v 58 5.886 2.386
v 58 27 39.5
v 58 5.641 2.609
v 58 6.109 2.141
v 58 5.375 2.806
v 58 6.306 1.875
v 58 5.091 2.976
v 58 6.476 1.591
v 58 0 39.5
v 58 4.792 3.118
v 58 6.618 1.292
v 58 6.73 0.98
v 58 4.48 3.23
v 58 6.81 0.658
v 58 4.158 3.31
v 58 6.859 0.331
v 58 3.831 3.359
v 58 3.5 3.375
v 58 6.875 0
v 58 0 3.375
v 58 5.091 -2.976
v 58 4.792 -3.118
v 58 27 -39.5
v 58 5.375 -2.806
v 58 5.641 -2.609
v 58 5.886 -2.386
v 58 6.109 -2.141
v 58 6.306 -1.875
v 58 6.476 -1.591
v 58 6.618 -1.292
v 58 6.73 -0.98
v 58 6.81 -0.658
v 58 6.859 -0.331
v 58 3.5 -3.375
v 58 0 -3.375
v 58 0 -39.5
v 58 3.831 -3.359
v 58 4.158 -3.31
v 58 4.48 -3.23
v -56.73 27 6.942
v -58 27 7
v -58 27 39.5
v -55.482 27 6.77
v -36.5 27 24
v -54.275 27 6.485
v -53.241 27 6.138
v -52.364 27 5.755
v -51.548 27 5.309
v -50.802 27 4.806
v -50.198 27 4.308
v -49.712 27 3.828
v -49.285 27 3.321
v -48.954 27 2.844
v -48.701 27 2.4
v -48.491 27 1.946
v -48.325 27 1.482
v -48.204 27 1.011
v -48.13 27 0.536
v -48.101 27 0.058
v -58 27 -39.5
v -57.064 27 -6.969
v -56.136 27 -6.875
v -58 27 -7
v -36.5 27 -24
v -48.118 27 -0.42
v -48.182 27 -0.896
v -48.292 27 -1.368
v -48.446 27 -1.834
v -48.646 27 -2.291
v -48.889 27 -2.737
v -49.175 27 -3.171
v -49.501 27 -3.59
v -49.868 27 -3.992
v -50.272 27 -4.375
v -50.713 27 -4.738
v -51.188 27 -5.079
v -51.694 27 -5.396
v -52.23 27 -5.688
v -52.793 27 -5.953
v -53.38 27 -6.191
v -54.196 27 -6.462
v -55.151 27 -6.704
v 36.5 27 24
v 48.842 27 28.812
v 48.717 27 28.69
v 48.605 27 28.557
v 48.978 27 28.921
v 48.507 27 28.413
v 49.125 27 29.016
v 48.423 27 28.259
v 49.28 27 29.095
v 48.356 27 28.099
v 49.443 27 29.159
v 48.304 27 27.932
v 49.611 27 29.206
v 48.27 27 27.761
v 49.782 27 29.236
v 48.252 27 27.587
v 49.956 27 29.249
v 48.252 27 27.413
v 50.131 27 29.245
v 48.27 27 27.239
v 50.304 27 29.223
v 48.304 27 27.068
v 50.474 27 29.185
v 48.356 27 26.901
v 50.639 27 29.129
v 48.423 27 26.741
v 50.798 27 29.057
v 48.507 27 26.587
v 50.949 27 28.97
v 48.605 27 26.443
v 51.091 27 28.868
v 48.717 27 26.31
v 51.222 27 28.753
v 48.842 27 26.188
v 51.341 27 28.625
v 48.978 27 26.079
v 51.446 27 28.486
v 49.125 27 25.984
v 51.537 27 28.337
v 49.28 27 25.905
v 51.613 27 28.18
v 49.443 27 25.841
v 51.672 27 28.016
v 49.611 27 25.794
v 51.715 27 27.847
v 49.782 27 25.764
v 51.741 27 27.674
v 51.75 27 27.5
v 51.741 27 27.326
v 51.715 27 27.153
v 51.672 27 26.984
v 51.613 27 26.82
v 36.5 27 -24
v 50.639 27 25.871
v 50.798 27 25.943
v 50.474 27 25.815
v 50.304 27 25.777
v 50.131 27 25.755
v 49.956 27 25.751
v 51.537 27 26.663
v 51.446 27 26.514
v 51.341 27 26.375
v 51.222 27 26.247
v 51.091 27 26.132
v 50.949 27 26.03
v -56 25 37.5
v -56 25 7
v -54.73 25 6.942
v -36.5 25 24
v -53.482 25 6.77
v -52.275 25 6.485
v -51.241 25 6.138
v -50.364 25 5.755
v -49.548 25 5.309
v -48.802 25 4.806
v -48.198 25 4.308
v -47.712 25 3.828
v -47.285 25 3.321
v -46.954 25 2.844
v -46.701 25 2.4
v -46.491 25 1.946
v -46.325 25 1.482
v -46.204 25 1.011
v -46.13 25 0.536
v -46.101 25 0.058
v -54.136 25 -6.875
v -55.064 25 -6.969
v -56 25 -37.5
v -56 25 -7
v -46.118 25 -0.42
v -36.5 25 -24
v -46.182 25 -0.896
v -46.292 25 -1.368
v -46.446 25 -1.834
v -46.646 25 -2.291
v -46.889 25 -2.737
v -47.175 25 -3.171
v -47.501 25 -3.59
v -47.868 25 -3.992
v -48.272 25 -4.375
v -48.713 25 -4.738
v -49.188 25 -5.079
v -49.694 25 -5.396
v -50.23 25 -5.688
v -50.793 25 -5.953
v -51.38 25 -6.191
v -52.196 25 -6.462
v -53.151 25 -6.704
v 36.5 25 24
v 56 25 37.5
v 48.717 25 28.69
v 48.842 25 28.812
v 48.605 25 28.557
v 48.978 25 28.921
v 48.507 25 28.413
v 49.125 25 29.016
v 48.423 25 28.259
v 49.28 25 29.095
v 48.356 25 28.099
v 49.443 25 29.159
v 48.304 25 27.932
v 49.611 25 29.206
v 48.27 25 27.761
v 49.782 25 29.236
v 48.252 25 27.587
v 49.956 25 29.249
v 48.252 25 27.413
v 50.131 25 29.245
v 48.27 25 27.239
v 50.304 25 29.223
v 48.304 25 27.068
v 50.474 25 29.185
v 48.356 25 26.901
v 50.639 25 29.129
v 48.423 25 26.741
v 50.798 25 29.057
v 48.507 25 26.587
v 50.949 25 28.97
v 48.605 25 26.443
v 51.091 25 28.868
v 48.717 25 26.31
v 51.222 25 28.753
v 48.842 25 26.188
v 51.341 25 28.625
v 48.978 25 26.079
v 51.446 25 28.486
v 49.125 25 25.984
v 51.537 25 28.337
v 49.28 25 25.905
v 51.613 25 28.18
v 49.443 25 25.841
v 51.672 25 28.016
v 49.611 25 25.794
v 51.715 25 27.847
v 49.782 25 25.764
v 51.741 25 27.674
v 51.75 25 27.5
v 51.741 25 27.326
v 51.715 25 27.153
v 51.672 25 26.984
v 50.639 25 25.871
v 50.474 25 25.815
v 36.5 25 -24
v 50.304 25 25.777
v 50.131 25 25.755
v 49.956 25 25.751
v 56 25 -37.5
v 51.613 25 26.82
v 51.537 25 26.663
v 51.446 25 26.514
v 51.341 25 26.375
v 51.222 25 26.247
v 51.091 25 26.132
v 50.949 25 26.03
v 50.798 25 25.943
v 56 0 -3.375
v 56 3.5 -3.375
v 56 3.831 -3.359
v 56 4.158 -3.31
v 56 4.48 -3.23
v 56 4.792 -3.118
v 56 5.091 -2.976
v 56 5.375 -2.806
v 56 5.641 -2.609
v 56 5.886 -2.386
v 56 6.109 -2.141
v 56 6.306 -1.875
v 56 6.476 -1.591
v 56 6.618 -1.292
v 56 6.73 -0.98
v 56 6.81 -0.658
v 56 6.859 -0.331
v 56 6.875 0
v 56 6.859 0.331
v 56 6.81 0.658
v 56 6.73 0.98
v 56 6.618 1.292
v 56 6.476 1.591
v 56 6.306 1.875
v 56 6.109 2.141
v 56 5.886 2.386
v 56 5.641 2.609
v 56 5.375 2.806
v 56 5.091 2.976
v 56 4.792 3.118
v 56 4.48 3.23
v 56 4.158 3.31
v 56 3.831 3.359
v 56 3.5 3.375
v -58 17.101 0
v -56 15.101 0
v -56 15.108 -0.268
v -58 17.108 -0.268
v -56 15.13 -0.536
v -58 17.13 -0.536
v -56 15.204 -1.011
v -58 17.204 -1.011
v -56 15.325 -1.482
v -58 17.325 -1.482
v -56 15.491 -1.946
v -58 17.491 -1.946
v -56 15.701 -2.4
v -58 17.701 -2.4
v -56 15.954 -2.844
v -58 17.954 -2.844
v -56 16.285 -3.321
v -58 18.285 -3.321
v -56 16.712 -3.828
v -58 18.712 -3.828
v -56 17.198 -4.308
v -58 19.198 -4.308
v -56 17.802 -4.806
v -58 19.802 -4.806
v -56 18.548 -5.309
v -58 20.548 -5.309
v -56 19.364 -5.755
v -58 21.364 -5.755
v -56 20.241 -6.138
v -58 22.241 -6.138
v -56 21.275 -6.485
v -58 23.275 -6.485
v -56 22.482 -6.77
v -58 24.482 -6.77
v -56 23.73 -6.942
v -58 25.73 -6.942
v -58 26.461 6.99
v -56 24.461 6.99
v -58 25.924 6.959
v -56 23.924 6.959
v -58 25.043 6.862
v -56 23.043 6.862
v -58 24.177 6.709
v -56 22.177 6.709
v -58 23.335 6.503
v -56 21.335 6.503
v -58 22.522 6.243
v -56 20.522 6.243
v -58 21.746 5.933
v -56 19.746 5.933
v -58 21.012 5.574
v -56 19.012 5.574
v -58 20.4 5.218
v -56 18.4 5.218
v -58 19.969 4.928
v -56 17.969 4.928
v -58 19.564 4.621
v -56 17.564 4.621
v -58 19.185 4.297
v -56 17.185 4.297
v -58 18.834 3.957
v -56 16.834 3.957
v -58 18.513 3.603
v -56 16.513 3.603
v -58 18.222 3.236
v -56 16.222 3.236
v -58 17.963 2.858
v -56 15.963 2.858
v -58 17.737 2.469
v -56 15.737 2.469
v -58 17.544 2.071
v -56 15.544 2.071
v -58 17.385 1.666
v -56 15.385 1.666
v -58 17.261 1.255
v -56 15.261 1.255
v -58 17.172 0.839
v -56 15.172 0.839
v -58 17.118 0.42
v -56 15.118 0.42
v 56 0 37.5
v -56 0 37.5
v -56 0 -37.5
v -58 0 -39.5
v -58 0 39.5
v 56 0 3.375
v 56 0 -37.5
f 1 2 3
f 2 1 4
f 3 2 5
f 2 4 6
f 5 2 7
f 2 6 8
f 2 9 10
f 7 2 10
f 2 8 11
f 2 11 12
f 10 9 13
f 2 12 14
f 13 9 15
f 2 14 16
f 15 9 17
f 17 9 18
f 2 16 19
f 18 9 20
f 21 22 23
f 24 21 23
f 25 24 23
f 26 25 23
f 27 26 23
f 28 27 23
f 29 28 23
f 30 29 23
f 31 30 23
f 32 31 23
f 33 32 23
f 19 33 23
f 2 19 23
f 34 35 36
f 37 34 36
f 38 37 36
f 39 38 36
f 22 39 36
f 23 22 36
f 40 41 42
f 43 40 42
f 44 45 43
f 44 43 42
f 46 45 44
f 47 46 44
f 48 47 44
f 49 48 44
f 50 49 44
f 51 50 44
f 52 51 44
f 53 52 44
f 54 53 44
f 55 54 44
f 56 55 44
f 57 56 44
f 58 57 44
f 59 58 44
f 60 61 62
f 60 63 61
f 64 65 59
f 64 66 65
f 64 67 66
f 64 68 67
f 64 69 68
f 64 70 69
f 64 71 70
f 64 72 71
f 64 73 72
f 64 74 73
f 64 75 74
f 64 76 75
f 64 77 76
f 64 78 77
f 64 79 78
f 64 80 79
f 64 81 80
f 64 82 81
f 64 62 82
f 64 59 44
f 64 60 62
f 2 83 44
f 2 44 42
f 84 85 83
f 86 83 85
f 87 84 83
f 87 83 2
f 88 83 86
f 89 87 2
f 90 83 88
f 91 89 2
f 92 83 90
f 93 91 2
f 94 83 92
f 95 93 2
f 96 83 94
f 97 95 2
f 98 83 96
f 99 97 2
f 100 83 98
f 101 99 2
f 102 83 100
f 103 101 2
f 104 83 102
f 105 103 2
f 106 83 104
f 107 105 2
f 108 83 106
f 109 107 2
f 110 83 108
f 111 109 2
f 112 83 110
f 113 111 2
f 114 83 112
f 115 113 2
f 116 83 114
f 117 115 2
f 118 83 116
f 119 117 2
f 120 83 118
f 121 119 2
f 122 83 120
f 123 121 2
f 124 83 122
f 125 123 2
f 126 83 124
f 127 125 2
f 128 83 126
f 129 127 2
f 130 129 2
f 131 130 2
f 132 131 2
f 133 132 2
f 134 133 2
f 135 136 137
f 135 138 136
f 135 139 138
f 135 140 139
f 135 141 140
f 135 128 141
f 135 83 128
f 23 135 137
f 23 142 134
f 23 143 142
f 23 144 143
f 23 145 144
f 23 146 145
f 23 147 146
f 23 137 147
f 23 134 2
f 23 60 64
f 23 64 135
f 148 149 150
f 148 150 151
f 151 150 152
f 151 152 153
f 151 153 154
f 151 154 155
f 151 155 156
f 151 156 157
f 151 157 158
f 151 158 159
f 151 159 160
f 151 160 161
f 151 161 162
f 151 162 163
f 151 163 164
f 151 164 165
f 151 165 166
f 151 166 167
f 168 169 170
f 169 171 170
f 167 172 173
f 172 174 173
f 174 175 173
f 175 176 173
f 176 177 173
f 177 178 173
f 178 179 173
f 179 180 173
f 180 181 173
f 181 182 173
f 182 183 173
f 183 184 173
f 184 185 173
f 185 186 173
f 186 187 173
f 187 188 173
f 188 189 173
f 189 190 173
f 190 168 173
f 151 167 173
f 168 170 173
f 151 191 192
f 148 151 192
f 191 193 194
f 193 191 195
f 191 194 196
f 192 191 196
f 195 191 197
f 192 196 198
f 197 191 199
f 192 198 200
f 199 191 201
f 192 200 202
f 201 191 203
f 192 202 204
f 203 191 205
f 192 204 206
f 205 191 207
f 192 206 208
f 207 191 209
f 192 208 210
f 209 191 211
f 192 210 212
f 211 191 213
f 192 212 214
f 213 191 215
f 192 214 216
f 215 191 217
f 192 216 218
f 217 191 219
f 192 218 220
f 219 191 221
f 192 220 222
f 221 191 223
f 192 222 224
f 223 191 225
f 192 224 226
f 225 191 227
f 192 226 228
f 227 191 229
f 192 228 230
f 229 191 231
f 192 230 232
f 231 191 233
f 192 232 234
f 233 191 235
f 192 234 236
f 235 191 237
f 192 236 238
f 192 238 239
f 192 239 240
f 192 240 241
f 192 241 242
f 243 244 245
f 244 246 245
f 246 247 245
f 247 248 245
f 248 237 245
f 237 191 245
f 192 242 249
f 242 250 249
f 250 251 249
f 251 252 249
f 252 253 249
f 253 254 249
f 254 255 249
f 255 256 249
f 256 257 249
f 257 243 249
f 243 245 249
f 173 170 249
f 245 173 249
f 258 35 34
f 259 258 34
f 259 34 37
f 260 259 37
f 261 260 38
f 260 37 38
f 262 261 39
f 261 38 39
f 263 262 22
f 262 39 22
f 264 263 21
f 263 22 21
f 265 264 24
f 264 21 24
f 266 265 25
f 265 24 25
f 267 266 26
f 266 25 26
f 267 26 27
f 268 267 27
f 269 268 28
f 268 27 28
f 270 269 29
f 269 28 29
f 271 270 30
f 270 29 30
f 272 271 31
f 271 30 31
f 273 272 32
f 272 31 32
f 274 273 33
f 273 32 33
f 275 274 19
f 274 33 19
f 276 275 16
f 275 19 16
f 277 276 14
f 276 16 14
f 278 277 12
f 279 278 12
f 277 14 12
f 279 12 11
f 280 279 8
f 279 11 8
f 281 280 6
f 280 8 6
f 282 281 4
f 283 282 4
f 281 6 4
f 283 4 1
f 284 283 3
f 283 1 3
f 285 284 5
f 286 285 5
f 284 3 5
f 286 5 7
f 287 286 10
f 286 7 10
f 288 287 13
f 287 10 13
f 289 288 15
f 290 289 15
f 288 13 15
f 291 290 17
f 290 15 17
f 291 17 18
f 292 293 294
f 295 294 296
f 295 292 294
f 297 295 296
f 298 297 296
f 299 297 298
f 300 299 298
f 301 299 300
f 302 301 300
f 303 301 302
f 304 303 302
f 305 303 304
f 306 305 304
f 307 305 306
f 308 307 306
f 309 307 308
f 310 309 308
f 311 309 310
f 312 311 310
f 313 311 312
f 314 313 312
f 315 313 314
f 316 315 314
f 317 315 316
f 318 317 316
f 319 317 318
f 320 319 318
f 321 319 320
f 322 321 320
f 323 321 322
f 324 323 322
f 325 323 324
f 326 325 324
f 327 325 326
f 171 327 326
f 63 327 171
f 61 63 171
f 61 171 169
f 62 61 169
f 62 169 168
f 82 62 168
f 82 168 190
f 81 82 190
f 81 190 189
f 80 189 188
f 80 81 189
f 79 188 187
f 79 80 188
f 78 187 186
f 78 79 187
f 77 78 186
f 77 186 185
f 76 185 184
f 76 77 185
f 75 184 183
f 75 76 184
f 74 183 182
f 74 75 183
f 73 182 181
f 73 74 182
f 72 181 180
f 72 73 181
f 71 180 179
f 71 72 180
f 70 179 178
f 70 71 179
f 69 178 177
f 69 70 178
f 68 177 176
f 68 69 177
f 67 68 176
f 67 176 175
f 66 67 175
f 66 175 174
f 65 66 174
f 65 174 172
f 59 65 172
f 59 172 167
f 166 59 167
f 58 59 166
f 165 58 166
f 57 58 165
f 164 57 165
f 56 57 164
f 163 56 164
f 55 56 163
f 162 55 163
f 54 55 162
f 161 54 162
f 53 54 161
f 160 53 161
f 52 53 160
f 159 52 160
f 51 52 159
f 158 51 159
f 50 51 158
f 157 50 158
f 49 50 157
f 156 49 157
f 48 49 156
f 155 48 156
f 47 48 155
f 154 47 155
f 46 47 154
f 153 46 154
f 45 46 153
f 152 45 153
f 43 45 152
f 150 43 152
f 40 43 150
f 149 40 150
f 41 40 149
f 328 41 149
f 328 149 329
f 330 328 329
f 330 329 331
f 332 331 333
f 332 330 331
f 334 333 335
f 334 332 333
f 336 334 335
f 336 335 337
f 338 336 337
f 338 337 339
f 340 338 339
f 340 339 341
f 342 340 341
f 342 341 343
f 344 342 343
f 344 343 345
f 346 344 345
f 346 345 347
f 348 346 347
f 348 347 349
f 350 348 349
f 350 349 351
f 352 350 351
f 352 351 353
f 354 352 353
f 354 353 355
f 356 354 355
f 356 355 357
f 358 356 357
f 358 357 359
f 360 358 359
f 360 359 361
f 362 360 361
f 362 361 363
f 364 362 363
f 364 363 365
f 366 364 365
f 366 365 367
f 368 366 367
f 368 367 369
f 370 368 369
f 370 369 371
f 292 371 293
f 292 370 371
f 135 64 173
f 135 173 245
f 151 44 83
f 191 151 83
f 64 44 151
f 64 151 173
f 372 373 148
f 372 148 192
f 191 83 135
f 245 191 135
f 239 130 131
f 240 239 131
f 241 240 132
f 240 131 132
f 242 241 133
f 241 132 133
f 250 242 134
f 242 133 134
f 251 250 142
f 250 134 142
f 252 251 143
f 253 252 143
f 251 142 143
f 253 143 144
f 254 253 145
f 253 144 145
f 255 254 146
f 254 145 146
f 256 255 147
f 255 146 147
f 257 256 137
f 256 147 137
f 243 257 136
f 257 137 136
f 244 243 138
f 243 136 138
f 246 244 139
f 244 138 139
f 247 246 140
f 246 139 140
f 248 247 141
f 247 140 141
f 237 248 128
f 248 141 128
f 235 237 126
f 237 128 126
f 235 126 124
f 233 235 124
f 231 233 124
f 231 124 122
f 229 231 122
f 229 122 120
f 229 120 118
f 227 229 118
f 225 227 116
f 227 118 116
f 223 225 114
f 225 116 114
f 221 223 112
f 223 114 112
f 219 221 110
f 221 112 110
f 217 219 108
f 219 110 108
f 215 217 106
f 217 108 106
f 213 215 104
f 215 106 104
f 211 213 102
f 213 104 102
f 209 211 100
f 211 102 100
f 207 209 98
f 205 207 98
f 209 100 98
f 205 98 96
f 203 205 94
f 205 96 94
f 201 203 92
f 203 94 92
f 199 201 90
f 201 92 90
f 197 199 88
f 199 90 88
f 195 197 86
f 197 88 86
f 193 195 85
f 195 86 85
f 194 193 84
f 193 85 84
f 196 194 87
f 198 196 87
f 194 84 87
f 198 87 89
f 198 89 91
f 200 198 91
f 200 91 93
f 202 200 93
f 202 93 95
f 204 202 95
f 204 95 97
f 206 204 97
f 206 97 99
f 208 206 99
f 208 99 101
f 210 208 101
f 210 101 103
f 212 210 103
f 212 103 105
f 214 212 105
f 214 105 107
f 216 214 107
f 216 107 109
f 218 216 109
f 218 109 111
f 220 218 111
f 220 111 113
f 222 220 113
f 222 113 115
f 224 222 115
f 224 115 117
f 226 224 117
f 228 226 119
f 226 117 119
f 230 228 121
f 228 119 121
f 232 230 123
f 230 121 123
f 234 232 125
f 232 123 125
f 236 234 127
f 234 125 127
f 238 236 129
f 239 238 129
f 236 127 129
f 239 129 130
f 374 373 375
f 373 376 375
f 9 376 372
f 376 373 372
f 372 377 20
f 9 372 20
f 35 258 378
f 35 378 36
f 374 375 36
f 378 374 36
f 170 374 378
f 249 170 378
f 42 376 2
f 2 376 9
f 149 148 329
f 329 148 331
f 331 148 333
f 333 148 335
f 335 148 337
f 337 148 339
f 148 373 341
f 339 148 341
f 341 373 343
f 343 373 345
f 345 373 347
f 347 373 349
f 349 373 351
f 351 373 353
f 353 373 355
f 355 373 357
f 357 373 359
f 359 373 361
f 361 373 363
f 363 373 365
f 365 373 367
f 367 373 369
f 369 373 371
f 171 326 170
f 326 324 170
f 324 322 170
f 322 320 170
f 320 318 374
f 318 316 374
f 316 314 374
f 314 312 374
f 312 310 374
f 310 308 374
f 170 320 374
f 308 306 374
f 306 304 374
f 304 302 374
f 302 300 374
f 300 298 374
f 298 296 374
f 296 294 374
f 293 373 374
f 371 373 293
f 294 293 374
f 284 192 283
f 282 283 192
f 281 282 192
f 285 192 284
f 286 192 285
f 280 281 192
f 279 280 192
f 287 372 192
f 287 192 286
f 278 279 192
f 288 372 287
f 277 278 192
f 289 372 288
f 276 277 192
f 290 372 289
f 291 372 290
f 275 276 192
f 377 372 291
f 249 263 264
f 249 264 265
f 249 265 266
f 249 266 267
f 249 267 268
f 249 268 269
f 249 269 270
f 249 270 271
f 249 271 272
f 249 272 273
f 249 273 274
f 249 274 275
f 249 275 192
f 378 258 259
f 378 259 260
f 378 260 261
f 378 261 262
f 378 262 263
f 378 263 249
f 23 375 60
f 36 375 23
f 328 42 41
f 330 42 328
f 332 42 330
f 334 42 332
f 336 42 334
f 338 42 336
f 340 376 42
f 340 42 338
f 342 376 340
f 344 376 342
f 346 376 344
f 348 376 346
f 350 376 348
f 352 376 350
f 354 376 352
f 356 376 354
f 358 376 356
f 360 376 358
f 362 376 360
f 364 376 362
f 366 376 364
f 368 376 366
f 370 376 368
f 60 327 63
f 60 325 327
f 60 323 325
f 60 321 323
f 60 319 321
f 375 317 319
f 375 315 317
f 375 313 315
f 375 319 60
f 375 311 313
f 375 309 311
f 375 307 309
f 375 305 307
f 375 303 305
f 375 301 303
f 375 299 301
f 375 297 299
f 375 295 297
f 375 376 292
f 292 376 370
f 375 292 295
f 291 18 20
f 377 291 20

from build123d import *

# Parameters (mm, degrees)
SKETCH1_W           = 116
SKETCH1_H           = 79
SKETCH1_W_2         = 112
SKETCH1_H_2         = 75
BOSS_EXTRUDE1_DEPTH = 25
SKETCH2_W           = 116
SKETCH2_H           = 79
BOSS_EXTRUDE2_DEPTH = 2
SKETCH3_W           = 73
SKETCH3_H           = 48
CUT_EXTRUDE1_DEPTH  = 2
SKETCH4_R           = 1.75
CUT_EXTRUDE2_DEPTH  = 2
SKETCH6_R           = 7
CUT_EXTRUDE3_DEPTH  = 10
CUT_EXTRUDE4_DEPTH  = 2


with BuildPart() as part:
    # Sketch1 → Boss-Extrude1 (new body)
    with BuildSketch(Plane(origin=(0, 0, 0), x_dir=(1, 0, 0), z_dir=(0, 1, 0))):
        Rectangle(SKETCH1_W, SKETCH1_H)
        Rectangle(SKETCH1_W_2, SKETCH1_H_2, mode=Mode.SUBTRACT)
    extrude(amount=BOSS_EXTRUDE1_DEPTH)

    # Sketch2 → Boss-Extrude2 (add)
    with BuildSketch(Plane(origin=(0, 25, 0), x_dir=(1, 0, 0), z_dir=(0, 1, 0))):
        Rectangle(SKETCH2_W, SKETCH2_H)
    extrude(amount=BOSS_EXTRUDE2_DEPTH)

    # Sketch3 → Cut-Extrude1 (cut)
    with BuildSketch(Plane(origin=(0, 27, 0), x_dir=(1, 0, 0), z_dir=(0, 1, 0))):
        Rectangle(SKETCH3_W, SKETCH3_H)
    extrude(amount=-CUT_EXTRUDE1_DEPTH, mode=Mode.SUBTRACT)

    # Sketch4 → Cut-Extrude2 (cut)
    with BuildSketch(Plane(origin=(0, 27, 0), x_dir=(1, 0, 0), z_dir=(0, 1, 0))):
        with Locations((50, -27.5)):
            Circle(SKETCH4_R)
    extrude(amount=-CUT_EXTRUDE2_DEPTH, mode=Mode.SUBTRACT)

    # Sketch6 → Cut-Extrude3 (cut)
    with BuildSketch(Plane(origin=(-42.5, 42.5, 0), x_dir=(-0.707106781, -0.707106781, 0), z_dir=(0.707106781, -0.707106781, 0))):
        with Locations((21.920310217, 0)):
            Circle(SKETCH6_R)
    extrude(amount=CUT_EXTRUDE3_DEPTH, mode=Mode.SUBTRACT)

    # Sketch7 → Cut-Extrude4 (cut)
    with BuildSketch(Plane(origin=(58, 0, 0), x_dir=(0, 0, -1), z_dir=(1, 0, 0))):
        with BuildLine():
            Line((-3.375, 3.5), (-3.375, 0))
            Line((-3.375, 0), (3.375, 0))
            Line((3.375, 0), (3.375, 3.5))
            ThreePointArc((3.375, 3.5), (0, 6.875), (-3.375, 3.5))
        make_face()
    extrude(amount=-CUT_EXTRUDE4_DEPTH, mode=Mode.SUBTRACT)


solid = part.part
